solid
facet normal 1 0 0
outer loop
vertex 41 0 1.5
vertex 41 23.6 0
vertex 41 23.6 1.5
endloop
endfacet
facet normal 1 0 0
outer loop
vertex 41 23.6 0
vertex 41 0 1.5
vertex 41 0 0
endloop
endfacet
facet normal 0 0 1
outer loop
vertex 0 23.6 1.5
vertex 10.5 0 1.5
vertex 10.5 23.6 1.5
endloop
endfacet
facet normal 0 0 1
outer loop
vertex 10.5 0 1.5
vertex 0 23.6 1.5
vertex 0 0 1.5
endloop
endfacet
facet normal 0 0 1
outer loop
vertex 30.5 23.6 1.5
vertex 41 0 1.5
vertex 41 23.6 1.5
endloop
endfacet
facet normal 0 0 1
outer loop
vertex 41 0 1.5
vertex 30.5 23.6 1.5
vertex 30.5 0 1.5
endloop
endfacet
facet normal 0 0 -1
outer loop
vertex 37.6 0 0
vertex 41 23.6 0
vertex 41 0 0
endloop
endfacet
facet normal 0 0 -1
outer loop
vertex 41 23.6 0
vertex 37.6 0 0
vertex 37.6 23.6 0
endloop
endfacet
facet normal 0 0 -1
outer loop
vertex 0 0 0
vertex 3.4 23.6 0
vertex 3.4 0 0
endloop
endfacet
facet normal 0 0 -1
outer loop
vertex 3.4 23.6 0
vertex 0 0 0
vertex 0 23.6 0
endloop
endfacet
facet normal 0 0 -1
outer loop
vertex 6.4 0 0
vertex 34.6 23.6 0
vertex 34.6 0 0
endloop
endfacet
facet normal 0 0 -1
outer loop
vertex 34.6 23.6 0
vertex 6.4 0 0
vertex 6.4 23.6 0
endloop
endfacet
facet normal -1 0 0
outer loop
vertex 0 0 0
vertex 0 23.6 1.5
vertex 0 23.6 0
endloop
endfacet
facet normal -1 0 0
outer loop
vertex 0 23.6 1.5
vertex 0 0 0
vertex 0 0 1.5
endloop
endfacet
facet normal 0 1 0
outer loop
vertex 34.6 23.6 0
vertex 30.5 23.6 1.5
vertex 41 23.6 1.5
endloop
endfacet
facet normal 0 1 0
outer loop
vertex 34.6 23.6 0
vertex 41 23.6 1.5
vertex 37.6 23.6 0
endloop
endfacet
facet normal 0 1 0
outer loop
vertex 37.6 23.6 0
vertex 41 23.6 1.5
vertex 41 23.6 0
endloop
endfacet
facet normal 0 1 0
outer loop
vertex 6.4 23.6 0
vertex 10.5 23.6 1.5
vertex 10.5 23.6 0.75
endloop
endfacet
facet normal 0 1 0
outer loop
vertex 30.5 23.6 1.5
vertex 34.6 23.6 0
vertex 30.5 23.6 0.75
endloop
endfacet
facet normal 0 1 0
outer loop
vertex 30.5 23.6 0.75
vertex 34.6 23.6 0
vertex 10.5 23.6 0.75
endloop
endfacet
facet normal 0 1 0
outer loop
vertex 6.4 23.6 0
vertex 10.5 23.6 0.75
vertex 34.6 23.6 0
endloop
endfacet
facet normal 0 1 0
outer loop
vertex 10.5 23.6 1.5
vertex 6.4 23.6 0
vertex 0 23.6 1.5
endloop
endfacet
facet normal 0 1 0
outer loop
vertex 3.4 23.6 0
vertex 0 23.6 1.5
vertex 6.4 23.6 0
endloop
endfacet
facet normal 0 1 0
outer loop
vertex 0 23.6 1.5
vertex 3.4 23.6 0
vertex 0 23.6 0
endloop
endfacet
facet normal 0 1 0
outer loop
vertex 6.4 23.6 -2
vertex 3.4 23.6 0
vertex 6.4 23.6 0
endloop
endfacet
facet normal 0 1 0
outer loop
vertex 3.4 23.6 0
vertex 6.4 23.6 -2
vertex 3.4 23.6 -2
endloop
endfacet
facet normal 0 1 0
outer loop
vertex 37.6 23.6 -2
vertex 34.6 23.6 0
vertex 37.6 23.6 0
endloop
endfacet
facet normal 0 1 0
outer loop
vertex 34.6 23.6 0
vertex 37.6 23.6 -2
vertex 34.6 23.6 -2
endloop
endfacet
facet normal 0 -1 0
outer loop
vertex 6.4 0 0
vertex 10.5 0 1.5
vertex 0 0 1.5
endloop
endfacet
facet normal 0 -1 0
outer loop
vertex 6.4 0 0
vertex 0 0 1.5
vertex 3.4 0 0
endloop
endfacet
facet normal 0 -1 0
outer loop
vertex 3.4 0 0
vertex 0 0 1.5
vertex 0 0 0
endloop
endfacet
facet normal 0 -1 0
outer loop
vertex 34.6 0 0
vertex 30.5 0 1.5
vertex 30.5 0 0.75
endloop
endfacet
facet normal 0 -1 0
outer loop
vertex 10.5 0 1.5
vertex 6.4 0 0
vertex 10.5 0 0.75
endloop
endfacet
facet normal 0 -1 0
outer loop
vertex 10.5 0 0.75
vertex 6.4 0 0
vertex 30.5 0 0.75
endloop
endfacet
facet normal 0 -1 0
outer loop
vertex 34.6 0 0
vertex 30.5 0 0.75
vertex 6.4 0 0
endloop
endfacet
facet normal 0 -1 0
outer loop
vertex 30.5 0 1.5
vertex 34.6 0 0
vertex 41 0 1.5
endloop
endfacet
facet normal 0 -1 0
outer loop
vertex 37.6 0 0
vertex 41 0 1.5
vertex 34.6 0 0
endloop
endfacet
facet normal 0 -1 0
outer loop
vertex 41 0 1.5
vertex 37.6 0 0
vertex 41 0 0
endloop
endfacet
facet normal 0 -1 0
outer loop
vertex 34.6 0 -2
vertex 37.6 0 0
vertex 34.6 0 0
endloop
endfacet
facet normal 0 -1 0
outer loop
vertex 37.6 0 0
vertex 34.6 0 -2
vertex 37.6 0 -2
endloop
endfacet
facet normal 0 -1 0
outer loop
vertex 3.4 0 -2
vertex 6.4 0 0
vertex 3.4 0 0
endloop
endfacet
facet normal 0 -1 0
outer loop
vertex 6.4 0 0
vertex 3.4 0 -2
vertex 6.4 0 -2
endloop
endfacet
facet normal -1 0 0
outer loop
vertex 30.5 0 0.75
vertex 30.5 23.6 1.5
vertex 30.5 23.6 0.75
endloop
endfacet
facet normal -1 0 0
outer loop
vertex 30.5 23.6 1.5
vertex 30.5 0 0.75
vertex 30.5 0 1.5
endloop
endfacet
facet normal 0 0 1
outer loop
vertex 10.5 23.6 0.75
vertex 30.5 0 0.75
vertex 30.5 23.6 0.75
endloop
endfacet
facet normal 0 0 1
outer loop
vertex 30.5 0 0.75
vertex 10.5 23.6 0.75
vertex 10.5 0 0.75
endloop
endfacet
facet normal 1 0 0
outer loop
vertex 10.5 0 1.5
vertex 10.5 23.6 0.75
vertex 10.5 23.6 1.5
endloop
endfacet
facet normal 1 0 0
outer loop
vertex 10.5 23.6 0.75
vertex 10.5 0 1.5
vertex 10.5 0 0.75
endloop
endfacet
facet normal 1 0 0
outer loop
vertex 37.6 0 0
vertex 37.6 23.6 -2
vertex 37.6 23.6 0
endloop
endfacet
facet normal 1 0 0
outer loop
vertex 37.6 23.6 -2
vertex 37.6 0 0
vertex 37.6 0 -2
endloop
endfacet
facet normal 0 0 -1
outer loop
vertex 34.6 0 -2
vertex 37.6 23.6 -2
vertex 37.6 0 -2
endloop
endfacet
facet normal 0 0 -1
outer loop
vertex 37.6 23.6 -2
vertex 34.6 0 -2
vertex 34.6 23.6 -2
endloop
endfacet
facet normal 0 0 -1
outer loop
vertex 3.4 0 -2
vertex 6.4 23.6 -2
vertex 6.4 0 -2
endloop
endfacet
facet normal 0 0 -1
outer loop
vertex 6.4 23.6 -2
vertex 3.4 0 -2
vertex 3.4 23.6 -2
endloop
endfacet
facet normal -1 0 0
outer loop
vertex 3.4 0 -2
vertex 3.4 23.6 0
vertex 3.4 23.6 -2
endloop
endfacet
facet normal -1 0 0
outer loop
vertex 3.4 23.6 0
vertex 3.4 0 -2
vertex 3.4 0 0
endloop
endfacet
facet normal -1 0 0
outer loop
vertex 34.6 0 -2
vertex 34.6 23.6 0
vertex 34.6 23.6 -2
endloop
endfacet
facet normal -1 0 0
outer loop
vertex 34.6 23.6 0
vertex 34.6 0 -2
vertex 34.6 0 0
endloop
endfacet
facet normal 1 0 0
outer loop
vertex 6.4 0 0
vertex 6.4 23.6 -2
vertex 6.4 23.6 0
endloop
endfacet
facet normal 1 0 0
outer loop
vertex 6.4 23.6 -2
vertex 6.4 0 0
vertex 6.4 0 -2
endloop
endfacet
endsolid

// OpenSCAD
// batteryholder for eb185

bat_w = 36;
bat_l = 72;
holder_str = 2.5;
holder_w = 4;

plate_str = 1.5;
holder_h = 10;
slit_l = 23.6;

plate_w = bat_w + 2*holder_str;
plate_l = bat_l + 2*holder_str;

module holderA (){
difference() {
  cube([bat_l + 2*holder_str, bat_w + 2*holder_str, 10]);
  translate([holder_str,holder_str,holder_str])
    cube([bat_l, bat_w, 10]);
}
}

module test() {
mid_cube_len = (bat_l/4 - 2*holder_w) * 2;
  translate([bat_l/2 - mid_cube_len/2, (bat_w - holder_w)/2 - 20, 0])
    cube([mid_cube_len, 20, 20]);
  translate([bat_l/2 - mid_cube_len/2, (bat_w + holder_w) - 20, 0])
    cube([mid_cube_len, 20, 20]);
}


module holder() {

  union() {
    cube([plate_w, slit_l, plate_str]);
    cube([holder_str, slit_l, holder_h]);
    translate([plate_w-holder_str,0,0])
      cube([holder_str, slit_l, holder_h]);
  }
  translate([plate_w/2-20/2,-12,0])
    union() {
      cube([20, plate_l, plate_str]);
      cube([20, holder_str, holder_h]);
      translate([0,plate_l-holder_str,0])
        cube([20, holder_str, holder_h]);
    }
}
  
module feet() {
  translate([(41-(28.2+2*3))/2, 0, -2]) 
    difference () {
      cube([28.2+2*3, 23.6, 2]);
      translate([3,0,0])
        cube([28.2, 23.6, 2]);
    }
}

//holder();
difference() {
  cube([plate_w, slit_l, plate_str]);
  translate([plate_w/2-20/2, 0, plate_str/2])
    cube([20, slit_l, plate_str/2]);
}
feet();
